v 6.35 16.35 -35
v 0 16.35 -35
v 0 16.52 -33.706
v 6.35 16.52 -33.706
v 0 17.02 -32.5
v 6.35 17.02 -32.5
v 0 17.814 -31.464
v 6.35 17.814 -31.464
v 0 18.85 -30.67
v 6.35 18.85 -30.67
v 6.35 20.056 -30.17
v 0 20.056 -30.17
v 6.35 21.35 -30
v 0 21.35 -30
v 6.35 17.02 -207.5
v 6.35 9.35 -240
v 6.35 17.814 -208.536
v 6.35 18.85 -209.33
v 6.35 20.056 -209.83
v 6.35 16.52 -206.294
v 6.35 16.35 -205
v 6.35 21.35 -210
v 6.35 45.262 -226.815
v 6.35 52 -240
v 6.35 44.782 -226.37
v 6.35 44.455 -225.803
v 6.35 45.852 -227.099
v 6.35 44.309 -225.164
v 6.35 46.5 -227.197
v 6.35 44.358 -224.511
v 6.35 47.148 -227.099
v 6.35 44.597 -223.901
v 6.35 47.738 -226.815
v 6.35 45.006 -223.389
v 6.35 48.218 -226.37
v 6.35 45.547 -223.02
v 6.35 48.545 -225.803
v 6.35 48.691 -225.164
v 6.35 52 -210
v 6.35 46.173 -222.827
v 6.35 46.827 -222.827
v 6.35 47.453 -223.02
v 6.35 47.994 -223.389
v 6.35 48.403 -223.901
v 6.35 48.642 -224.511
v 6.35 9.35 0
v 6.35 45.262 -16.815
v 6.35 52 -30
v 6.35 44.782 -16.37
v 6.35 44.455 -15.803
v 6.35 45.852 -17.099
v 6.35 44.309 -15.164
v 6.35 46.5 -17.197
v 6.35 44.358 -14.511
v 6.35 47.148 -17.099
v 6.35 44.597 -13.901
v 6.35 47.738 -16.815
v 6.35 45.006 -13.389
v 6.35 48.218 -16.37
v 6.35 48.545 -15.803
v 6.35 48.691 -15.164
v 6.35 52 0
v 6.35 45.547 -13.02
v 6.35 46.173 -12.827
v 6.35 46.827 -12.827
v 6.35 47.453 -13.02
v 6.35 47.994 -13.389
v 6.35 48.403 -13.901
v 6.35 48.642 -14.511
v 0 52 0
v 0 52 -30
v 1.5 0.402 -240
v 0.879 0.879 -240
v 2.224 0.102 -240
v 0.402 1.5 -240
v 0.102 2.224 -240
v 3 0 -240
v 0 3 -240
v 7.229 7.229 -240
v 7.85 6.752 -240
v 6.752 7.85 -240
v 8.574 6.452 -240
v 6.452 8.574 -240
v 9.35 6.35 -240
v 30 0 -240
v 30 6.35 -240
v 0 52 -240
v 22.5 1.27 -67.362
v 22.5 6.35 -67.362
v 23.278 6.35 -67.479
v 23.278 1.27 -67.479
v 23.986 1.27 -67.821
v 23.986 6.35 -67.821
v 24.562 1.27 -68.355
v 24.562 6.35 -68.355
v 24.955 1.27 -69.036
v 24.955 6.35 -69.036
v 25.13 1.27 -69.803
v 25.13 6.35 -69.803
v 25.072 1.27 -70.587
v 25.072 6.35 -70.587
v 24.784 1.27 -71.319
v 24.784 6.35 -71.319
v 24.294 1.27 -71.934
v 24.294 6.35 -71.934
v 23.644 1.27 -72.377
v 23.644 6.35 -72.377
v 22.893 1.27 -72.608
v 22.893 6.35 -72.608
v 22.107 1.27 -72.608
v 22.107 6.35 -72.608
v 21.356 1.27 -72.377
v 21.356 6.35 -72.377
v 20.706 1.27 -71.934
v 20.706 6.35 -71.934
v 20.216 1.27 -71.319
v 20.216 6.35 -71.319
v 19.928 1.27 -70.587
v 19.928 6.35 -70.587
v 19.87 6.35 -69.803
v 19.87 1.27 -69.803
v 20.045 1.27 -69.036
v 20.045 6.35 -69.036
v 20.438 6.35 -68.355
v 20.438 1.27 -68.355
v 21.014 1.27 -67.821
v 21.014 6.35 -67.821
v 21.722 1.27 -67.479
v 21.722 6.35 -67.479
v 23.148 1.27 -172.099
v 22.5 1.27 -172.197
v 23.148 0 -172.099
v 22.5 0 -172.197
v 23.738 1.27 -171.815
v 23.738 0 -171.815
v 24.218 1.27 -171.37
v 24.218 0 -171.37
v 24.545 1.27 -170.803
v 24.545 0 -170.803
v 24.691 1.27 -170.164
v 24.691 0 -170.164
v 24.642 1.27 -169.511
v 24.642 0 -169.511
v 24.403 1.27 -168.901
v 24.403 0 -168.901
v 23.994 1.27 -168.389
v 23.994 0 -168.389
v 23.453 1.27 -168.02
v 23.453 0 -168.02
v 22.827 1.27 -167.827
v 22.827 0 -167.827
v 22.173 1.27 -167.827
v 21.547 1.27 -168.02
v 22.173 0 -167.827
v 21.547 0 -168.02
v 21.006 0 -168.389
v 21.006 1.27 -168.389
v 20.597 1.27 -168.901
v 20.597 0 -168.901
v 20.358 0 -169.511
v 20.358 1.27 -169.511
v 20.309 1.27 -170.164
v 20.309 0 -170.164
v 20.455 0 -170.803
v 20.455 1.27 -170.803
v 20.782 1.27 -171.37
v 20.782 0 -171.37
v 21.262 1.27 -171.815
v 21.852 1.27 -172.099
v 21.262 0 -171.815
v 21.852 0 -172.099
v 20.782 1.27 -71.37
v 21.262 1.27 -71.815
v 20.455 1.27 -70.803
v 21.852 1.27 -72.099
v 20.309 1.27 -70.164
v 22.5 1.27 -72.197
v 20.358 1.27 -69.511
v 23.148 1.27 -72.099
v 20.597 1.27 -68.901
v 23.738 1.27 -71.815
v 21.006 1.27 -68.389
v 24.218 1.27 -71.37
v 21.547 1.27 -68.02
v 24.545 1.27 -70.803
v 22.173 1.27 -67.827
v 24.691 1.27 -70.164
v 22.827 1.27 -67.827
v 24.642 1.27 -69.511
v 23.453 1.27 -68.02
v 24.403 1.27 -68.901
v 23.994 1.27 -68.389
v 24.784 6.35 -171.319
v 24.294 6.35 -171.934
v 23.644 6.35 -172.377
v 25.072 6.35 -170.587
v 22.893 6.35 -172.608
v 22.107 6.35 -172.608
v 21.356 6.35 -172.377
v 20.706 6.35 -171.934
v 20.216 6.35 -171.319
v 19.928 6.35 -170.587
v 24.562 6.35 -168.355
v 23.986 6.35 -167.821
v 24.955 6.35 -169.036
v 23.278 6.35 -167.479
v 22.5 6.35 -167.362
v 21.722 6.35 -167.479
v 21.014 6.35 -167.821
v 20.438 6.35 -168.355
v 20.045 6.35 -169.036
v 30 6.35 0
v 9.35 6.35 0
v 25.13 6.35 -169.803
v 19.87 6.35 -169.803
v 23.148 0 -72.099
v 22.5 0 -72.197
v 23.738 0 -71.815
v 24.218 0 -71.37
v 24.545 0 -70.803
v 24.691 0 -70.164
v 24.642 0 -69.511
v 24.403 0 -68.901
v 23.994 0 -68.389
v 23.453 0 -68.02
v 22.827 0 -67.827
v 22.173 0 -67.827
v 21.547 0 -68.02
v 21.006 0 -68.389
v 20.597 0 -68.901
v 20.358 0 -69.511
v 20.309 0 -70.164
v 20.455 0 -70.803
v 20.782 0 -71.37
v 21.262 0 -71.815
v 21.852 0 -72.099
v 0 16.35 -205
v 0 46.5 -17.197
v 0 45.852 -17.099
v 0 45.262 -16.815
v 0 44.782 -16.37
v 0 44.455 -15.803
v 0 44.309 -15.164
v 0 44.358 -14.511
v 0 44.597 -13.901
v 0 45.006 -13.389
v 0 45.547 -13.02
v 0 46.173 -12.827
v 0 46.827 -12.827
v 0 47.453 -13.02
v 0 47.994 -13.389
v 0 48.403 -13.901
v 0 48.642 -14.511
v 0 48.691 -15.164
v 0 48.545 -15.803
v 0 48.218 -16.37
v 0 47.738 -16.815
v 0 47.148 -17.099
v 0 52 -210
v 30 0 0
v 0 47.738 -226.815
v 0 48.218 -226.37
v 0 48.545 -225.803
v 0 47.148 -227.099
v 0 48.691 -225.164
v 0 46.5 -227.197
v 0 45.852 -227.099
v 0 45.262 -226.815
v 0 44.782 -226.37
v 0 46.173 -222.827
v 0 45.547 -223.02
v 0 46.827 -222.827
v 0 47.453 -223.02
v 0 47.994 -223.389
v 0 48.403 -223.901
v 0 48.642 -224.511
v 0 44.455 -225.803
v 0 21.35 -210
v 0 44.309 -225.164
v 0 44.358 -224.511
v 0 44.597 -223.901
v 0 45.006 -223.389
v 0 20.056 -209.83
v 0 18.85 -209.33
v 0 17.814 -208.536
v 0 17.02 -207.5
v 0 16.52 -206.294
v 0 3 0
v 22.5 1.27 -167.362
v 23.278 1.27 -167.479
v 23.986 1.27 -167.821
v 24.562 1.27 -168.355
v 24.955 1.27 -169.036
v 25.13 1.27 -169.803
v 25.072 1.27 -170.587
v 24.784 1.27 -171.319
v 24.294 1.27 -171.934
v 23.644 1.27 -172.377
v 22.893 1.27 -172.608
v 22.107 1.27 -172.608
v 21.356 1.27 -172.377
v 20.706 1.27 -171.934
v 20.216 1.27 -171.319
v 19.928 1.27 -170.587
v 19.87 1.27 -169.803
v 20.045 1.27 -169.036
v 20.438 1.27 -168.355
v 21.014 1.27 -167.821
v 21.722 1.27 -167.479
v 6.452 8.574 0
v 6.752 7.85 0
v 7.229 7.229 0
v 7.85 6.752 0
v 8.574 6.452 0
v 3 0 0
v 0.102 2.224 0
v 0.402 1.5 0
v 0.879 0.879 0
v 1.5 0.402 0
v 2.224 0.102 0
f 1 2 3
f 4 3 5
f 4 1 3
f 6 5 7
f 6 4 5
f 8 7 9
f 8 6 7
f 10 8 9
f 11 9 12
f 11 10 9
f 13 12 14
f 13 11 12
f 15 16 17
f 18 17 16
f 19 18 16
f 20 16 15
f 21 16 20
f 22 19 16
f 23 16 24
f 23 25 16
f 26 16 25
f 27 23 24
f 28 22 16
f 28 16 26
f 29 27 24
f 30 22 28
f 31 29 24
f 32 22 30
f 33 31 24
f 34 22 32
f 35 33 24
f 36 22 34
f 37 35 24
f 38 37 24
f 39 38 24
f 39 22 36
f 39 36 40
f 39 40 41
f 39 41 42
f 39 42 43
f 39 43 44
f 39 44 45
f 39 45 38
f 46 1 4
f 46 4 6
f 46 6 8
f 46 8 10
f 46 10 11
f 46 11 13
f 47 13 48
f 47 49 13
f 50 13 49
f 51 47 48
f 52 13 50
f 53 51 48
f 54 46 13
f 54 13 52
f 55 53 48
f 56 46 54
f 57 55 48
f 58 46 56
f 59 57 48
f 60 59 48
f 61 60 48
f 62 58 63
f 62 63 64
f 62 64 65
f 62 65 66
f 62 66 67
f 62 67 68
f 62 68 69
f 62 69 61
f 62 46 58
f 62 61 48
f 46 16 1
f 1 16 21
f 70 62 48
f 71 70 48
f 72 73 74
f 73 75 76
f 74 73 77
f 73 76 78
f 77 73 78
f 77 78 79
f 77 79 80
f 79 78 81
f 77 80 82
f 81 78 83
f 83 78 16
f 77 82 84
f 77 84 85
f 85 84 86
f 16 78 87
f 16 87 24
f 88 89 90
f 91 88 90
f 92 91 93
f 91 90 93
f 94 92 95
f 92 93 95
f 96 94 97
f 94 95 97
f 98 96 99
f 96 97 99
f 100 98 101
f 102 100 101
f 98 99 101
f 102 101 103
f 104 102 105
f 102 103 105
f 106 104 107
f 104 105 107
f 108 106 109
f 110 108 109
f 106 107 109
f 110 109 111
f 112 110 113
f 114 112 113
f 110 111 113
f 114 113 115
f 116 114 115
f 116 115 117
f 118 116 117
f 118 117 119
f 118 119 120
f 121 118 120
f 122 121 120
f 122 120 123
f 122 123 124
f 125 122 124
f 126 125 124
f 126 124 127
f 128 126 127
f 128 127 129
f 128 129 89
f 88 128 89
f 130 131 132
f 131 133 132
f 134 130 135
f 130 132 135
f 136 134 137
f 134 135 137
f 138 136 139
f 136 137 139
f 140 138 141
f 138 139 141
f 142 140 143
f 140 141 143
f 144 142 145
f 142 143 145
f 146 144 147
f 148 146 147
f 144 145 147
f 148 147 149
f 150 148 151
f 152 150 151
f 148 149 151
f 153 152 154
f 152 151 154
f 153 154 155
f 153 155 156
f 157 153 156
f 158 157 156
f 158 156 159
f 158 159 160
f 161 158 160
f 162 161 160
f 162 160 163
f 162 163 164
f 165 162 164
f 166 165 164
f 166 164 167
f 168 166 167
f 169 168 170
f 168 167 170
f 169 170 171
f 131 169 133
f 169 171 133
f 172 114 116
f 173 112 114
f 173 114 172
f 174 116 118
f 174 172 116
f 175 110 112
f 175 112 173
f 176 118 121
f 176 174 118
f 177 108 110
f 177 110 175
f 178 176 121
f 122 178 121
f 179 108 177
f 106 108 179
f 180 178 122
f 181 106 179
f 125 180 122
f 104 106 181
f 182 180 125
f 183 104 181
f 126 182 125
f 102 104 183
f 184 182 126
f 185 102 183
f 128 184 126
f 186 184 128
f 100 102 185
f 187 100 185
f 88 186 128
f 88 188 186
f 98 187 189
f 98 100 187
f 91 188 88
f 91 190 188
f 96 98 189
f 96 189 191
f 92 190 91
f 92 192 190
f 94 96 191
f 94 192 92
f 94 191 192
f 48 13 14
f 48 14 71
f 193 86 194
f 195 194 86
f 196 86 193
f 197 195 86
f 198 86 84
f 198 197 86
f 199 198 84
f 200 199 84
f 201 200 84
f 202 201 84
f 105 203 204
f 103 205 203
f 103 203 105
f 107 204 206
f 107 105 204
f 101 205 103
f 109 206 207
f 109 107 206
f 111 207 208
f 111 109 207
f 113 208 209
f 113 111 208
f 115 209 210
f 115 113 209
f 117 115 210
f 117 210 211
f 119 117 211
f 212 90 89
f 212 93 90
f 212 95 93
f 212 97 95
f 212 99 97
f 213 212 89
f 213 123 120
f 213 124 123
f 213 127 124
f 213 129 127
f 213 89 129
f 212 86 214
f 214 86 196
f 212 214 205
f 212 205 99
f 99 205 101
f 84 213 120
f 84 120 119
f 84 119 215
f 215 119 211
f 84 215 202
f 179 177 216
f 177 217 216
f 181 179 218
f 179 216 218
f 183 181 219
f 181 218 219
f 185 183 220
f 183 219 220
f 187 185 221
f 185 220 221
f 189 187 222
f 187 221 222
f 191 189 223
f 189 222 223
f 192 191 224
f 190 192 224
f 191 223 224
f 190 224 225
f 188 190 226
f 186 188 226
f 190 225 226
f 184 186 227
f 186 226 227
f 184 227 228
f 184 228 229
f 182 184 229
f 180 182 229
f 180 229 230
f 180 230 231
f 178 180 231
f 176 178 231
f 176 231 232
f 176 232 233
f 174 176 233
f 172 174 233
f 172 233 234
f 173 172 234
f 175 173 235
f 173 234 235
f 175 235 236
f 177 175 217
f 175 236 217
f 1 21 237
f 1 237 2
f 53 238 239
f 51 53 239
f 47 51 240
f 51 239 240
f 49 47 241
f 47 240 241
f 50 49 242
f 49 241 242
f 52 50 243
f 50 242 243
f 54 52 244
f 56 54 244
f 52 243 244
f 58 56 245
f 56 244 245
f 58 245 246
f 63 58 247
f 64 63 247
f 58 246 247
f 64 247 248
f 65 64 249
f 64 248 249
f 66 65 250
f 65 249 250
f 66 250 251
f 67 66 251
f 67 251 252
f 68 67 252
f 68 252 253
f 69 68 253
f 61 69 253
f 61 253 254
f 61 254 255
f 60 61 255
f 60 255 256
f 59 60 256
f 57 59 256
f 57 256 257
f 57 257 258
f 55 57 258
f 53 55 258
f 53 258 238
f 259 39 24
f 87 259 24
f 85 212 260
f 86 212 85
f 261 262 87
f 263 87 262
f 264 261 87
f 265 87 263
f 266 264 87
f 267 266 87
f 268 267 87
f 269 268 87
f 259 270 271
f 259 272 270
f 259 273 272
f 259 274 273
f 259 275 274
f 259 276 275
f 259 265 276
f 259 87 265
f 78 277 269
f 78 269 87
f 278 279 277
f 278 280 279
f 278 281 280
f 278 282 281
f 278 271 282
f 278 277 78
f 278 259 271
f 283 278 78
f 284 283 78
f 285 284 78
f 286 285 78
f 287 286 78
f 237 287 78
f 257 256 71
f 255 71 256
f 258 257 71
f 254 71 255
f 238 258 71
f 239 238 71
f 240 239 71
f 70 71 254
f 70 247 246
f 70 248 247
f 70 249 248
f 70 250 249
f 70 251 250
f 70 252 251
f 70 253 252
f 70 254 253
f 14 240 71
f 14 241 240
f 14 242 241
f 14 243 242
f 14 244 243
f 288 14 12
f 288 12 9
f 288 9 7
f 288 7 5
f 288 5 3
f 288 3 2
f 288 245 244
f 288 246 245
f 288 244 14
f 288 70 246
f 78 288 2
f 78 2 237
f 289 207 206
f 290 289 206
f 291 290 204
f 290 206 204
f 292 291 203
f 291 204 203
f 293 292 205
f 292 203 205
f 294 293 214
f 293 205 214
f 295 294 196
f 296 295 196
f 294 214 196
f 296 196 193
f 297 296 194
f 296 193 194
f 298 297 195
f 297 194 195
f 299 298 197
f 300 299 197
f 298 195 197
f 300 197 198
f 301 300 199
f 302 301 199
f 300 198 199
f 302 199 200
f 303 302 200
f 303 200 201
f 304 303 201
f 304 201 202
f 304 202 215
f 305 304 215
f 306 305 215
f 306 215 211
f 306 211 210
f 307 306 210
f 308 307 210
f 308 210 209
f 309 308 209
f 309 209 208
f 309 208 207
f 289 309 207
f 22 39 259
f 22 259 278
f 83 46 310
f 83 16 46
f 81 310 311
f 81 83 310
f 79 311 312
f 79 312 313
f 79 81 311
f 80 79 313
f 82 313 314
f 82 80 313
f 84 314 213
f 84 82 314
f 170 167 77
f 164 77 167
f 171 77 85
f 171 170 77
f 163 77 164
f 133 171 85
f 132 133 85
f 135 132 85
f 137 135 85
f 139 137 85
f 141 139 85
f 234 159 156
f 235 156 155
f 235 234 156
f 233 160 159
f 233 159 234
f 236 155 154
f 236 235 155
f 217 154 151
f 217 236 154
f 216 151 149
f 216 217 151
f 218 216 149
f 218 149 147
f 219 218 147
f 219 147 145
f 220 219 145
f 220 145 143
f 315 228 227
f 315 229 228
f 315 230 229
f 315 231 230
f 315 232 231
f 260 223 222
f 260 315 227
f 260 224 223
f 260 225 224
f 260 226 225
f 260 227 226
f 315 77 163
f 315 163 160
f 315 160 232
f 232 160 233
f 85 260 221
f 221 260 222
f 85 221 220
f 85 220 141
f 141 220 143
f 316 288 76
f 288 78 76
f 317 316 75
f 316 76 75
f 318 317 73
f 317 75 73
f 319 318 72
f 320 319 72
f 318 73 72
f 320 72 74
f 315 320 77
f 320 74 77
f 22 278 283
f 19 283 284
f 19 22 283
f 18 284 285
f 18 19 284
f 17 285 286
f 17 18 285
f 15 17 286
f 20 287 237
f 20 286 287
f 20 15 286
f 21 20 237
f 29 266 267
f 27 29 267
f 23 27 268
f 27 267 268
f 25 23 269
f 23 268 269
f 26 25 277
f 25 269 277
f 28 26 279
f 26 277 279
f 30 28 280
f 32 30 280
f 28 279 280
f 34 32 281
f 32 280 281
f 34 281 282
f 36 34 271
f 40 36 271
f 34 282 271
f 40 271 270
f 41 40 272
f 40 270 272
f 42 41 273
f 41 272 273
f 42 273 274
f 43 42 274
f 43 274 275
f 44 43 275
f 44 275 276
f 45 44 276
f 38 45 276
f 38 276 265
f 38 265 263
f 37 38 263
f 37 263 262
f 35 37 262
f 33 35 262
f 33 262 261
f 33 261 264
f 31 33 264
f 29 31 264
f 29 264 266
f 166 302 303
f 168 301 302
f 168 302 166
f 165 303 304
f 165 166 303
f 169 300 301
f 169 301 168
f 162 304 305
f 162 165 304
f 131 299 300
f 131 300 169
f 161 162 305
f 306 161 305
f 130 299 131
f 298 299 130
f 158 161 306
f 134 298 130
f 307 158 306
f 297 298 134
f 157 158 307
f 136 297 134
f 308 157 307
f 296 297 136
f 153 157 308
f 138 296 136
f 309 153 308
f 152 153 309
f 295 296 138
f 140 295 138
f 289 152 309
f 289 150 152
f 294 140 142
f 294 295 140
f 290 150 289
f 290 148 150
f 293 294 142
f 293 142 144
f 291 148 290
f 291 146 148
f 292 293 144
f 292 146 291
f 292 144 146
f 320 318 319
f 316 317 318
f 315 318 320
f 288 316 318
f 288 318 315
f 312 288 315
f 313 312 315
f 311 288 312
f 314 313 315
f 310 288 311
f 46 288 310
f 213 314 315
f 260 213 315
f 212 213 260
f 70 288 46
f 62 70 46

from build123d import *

# Parameters (mm, degrees)
EXTRUDE_THIN1_DEPTH                        = 240
SKETCH3_W                                  = 35
SKETCH3_H                                  = 300
EXTRUDE2_DEPTH                             = 7.35
SKETCH7_W                                  = 300
SKETCH7_H                                  = 30
EXTRUDE4_DEPTH                             = 7.35
EXTRUDE5_DEPTH                             = 7.35
TAPPED_HOLE_FOR_8_32_HELICOIL1_D           = 4.3942
TAPPED_HOLE_FOR_8_32_HELICOIL2_D           = 4.3942
TAPPED_HOLE_FOR_8_32_HELICOIL2_DEPTH       = 11.1252
TAPPED_HOLE_FOR_8_32_HELICOIL2_CBORE_D     = 5.27558
TAPPED_HOLE_FOR_8_32_HELICOIL2_CBORE_DEPTH = 5.08
TAPPED_HOLE_FOR_8_32_HELICOIL2_TIP         = 1.320150866
FILLET5_R                                  = 3


with BuildPart() as part:
    # Sketch1 → Extrude-Thin1 (new body)
    with BuildSketch(Plane.XY):
        Polygon((0, 55), (0, 0), (50.8, 0), (50.8, 6.35), (6.35, 6.35), (6.35, 55), align=None)
    extrude(amount=-EXTRUDE_THIN1_DEPTH)

    # Sketch3 → Extrude2 (cut, through all)
    with BuildSketch(Plane(origin=(0, 6.35, 0), x_dir=(1, 0, 0), z_dir=(0, 1, 0))):
        with Locations((47.5, 95)):
            Rectangle(SKETCH3_W, SKETCH3_H)
    extrude(amount=-EXTRUDE2_DEPTH, mode=Mode.SUBTRACT)

    # Sketch7 → Extrude4 (cut, through all)
    with BuildSketch(Plane(origin=(6.35, 0, 0), x_dir=(0, 0, -1), z_dir=(1, 0, 0))):
        with Locations((145, 67)):
            Rectangle(SKETCH7_W, SKETCH7_H)
    extrude(amount=-EXTRUDE4_DEPTH, mode=Mode.SUBTRACT)

    # Sketch10 → Extrude5 (cut, through all)
    with BuildSketch(Plane(origin=(6.35, 0, 0), x_dir=(0, 0, -1), z_dir=(1, 0, 0))):
        with BuildLine():
            Line((30, 66.35), (210, 66.35))
            Line((210, 66.35), (210, 21.35))
            ThreePointArc((210, 21.35), (208.535533906, 17.814466094), (205, 16.35))
            Line((205, 16.35), (35, 16.35))
            ThreePointArc((35, 16.35), (31.464466094, 17.814466094), (30, 21.35))
            Line((30, 21.35), (30, 66.35))
        make_face()
    extrude(amount=-EXTRUDE5_DEPTH, mode=Mode.SUBTRACT)

    # Tapped Hole for #8-32 Helicoil1 (through all)
    with Locations(Plane(origin=(6.35, 46.5, -15), x_dir=(0, 0, 1), z_dir=(1, 0, 0))):
        with Locations((0, 0), (-210, 0)):
            Hole(TAPPED_HOLE_FOR_8_32_HELICOIL1_D / 2)

    # Tapped Hole for #8-32 Helicoil2
    with Locations(Plane(origin=(22.5, 6.35, -70), x_dir=(0, 0, 1), z_dir=(0, 1, 0))):
        with Locations((0, 0), (-100, 0)):
            CounterBoreHole(TAPPED_HOLE_FOR_8_32_HELICOIL2_D / 2, TAPPED_HOLE_FOR_8_32_HELICOIL2_CBORE_D / 2, TAPPED_HOLE_FOR_8_32_HELICOIL2_CBORE_DEPTH, depth=TAPPED_HOLE_FOR_8_32_HELICOIL2_DEPTH)
            with Locations((0, 0, -(TAPPED_HOLE_FOR_8_32_HELICOIL2_DEPTH + TAPPED_HOLE_FOR_8_32_HELICOIL2_TIP / 2))):  # 118° drill point
                Cone(0, TAPPED_HOLE_FOR_8_32_HELICOIL2_D / 2, TAPPED_HOLE_FOR_8_32_HELICOIL2_TIP, mode=Mode.SUBTRACT)

    # Fillet5
    fillet5_edges = [part.edges().sort_by_distance(p)[0] for p in [
        (6.35, 6.35, -120),
        (0, 0, -120),
    ]]
    fillet(fillet5_edges, radius=FILLET5_R)


solid = part.part
